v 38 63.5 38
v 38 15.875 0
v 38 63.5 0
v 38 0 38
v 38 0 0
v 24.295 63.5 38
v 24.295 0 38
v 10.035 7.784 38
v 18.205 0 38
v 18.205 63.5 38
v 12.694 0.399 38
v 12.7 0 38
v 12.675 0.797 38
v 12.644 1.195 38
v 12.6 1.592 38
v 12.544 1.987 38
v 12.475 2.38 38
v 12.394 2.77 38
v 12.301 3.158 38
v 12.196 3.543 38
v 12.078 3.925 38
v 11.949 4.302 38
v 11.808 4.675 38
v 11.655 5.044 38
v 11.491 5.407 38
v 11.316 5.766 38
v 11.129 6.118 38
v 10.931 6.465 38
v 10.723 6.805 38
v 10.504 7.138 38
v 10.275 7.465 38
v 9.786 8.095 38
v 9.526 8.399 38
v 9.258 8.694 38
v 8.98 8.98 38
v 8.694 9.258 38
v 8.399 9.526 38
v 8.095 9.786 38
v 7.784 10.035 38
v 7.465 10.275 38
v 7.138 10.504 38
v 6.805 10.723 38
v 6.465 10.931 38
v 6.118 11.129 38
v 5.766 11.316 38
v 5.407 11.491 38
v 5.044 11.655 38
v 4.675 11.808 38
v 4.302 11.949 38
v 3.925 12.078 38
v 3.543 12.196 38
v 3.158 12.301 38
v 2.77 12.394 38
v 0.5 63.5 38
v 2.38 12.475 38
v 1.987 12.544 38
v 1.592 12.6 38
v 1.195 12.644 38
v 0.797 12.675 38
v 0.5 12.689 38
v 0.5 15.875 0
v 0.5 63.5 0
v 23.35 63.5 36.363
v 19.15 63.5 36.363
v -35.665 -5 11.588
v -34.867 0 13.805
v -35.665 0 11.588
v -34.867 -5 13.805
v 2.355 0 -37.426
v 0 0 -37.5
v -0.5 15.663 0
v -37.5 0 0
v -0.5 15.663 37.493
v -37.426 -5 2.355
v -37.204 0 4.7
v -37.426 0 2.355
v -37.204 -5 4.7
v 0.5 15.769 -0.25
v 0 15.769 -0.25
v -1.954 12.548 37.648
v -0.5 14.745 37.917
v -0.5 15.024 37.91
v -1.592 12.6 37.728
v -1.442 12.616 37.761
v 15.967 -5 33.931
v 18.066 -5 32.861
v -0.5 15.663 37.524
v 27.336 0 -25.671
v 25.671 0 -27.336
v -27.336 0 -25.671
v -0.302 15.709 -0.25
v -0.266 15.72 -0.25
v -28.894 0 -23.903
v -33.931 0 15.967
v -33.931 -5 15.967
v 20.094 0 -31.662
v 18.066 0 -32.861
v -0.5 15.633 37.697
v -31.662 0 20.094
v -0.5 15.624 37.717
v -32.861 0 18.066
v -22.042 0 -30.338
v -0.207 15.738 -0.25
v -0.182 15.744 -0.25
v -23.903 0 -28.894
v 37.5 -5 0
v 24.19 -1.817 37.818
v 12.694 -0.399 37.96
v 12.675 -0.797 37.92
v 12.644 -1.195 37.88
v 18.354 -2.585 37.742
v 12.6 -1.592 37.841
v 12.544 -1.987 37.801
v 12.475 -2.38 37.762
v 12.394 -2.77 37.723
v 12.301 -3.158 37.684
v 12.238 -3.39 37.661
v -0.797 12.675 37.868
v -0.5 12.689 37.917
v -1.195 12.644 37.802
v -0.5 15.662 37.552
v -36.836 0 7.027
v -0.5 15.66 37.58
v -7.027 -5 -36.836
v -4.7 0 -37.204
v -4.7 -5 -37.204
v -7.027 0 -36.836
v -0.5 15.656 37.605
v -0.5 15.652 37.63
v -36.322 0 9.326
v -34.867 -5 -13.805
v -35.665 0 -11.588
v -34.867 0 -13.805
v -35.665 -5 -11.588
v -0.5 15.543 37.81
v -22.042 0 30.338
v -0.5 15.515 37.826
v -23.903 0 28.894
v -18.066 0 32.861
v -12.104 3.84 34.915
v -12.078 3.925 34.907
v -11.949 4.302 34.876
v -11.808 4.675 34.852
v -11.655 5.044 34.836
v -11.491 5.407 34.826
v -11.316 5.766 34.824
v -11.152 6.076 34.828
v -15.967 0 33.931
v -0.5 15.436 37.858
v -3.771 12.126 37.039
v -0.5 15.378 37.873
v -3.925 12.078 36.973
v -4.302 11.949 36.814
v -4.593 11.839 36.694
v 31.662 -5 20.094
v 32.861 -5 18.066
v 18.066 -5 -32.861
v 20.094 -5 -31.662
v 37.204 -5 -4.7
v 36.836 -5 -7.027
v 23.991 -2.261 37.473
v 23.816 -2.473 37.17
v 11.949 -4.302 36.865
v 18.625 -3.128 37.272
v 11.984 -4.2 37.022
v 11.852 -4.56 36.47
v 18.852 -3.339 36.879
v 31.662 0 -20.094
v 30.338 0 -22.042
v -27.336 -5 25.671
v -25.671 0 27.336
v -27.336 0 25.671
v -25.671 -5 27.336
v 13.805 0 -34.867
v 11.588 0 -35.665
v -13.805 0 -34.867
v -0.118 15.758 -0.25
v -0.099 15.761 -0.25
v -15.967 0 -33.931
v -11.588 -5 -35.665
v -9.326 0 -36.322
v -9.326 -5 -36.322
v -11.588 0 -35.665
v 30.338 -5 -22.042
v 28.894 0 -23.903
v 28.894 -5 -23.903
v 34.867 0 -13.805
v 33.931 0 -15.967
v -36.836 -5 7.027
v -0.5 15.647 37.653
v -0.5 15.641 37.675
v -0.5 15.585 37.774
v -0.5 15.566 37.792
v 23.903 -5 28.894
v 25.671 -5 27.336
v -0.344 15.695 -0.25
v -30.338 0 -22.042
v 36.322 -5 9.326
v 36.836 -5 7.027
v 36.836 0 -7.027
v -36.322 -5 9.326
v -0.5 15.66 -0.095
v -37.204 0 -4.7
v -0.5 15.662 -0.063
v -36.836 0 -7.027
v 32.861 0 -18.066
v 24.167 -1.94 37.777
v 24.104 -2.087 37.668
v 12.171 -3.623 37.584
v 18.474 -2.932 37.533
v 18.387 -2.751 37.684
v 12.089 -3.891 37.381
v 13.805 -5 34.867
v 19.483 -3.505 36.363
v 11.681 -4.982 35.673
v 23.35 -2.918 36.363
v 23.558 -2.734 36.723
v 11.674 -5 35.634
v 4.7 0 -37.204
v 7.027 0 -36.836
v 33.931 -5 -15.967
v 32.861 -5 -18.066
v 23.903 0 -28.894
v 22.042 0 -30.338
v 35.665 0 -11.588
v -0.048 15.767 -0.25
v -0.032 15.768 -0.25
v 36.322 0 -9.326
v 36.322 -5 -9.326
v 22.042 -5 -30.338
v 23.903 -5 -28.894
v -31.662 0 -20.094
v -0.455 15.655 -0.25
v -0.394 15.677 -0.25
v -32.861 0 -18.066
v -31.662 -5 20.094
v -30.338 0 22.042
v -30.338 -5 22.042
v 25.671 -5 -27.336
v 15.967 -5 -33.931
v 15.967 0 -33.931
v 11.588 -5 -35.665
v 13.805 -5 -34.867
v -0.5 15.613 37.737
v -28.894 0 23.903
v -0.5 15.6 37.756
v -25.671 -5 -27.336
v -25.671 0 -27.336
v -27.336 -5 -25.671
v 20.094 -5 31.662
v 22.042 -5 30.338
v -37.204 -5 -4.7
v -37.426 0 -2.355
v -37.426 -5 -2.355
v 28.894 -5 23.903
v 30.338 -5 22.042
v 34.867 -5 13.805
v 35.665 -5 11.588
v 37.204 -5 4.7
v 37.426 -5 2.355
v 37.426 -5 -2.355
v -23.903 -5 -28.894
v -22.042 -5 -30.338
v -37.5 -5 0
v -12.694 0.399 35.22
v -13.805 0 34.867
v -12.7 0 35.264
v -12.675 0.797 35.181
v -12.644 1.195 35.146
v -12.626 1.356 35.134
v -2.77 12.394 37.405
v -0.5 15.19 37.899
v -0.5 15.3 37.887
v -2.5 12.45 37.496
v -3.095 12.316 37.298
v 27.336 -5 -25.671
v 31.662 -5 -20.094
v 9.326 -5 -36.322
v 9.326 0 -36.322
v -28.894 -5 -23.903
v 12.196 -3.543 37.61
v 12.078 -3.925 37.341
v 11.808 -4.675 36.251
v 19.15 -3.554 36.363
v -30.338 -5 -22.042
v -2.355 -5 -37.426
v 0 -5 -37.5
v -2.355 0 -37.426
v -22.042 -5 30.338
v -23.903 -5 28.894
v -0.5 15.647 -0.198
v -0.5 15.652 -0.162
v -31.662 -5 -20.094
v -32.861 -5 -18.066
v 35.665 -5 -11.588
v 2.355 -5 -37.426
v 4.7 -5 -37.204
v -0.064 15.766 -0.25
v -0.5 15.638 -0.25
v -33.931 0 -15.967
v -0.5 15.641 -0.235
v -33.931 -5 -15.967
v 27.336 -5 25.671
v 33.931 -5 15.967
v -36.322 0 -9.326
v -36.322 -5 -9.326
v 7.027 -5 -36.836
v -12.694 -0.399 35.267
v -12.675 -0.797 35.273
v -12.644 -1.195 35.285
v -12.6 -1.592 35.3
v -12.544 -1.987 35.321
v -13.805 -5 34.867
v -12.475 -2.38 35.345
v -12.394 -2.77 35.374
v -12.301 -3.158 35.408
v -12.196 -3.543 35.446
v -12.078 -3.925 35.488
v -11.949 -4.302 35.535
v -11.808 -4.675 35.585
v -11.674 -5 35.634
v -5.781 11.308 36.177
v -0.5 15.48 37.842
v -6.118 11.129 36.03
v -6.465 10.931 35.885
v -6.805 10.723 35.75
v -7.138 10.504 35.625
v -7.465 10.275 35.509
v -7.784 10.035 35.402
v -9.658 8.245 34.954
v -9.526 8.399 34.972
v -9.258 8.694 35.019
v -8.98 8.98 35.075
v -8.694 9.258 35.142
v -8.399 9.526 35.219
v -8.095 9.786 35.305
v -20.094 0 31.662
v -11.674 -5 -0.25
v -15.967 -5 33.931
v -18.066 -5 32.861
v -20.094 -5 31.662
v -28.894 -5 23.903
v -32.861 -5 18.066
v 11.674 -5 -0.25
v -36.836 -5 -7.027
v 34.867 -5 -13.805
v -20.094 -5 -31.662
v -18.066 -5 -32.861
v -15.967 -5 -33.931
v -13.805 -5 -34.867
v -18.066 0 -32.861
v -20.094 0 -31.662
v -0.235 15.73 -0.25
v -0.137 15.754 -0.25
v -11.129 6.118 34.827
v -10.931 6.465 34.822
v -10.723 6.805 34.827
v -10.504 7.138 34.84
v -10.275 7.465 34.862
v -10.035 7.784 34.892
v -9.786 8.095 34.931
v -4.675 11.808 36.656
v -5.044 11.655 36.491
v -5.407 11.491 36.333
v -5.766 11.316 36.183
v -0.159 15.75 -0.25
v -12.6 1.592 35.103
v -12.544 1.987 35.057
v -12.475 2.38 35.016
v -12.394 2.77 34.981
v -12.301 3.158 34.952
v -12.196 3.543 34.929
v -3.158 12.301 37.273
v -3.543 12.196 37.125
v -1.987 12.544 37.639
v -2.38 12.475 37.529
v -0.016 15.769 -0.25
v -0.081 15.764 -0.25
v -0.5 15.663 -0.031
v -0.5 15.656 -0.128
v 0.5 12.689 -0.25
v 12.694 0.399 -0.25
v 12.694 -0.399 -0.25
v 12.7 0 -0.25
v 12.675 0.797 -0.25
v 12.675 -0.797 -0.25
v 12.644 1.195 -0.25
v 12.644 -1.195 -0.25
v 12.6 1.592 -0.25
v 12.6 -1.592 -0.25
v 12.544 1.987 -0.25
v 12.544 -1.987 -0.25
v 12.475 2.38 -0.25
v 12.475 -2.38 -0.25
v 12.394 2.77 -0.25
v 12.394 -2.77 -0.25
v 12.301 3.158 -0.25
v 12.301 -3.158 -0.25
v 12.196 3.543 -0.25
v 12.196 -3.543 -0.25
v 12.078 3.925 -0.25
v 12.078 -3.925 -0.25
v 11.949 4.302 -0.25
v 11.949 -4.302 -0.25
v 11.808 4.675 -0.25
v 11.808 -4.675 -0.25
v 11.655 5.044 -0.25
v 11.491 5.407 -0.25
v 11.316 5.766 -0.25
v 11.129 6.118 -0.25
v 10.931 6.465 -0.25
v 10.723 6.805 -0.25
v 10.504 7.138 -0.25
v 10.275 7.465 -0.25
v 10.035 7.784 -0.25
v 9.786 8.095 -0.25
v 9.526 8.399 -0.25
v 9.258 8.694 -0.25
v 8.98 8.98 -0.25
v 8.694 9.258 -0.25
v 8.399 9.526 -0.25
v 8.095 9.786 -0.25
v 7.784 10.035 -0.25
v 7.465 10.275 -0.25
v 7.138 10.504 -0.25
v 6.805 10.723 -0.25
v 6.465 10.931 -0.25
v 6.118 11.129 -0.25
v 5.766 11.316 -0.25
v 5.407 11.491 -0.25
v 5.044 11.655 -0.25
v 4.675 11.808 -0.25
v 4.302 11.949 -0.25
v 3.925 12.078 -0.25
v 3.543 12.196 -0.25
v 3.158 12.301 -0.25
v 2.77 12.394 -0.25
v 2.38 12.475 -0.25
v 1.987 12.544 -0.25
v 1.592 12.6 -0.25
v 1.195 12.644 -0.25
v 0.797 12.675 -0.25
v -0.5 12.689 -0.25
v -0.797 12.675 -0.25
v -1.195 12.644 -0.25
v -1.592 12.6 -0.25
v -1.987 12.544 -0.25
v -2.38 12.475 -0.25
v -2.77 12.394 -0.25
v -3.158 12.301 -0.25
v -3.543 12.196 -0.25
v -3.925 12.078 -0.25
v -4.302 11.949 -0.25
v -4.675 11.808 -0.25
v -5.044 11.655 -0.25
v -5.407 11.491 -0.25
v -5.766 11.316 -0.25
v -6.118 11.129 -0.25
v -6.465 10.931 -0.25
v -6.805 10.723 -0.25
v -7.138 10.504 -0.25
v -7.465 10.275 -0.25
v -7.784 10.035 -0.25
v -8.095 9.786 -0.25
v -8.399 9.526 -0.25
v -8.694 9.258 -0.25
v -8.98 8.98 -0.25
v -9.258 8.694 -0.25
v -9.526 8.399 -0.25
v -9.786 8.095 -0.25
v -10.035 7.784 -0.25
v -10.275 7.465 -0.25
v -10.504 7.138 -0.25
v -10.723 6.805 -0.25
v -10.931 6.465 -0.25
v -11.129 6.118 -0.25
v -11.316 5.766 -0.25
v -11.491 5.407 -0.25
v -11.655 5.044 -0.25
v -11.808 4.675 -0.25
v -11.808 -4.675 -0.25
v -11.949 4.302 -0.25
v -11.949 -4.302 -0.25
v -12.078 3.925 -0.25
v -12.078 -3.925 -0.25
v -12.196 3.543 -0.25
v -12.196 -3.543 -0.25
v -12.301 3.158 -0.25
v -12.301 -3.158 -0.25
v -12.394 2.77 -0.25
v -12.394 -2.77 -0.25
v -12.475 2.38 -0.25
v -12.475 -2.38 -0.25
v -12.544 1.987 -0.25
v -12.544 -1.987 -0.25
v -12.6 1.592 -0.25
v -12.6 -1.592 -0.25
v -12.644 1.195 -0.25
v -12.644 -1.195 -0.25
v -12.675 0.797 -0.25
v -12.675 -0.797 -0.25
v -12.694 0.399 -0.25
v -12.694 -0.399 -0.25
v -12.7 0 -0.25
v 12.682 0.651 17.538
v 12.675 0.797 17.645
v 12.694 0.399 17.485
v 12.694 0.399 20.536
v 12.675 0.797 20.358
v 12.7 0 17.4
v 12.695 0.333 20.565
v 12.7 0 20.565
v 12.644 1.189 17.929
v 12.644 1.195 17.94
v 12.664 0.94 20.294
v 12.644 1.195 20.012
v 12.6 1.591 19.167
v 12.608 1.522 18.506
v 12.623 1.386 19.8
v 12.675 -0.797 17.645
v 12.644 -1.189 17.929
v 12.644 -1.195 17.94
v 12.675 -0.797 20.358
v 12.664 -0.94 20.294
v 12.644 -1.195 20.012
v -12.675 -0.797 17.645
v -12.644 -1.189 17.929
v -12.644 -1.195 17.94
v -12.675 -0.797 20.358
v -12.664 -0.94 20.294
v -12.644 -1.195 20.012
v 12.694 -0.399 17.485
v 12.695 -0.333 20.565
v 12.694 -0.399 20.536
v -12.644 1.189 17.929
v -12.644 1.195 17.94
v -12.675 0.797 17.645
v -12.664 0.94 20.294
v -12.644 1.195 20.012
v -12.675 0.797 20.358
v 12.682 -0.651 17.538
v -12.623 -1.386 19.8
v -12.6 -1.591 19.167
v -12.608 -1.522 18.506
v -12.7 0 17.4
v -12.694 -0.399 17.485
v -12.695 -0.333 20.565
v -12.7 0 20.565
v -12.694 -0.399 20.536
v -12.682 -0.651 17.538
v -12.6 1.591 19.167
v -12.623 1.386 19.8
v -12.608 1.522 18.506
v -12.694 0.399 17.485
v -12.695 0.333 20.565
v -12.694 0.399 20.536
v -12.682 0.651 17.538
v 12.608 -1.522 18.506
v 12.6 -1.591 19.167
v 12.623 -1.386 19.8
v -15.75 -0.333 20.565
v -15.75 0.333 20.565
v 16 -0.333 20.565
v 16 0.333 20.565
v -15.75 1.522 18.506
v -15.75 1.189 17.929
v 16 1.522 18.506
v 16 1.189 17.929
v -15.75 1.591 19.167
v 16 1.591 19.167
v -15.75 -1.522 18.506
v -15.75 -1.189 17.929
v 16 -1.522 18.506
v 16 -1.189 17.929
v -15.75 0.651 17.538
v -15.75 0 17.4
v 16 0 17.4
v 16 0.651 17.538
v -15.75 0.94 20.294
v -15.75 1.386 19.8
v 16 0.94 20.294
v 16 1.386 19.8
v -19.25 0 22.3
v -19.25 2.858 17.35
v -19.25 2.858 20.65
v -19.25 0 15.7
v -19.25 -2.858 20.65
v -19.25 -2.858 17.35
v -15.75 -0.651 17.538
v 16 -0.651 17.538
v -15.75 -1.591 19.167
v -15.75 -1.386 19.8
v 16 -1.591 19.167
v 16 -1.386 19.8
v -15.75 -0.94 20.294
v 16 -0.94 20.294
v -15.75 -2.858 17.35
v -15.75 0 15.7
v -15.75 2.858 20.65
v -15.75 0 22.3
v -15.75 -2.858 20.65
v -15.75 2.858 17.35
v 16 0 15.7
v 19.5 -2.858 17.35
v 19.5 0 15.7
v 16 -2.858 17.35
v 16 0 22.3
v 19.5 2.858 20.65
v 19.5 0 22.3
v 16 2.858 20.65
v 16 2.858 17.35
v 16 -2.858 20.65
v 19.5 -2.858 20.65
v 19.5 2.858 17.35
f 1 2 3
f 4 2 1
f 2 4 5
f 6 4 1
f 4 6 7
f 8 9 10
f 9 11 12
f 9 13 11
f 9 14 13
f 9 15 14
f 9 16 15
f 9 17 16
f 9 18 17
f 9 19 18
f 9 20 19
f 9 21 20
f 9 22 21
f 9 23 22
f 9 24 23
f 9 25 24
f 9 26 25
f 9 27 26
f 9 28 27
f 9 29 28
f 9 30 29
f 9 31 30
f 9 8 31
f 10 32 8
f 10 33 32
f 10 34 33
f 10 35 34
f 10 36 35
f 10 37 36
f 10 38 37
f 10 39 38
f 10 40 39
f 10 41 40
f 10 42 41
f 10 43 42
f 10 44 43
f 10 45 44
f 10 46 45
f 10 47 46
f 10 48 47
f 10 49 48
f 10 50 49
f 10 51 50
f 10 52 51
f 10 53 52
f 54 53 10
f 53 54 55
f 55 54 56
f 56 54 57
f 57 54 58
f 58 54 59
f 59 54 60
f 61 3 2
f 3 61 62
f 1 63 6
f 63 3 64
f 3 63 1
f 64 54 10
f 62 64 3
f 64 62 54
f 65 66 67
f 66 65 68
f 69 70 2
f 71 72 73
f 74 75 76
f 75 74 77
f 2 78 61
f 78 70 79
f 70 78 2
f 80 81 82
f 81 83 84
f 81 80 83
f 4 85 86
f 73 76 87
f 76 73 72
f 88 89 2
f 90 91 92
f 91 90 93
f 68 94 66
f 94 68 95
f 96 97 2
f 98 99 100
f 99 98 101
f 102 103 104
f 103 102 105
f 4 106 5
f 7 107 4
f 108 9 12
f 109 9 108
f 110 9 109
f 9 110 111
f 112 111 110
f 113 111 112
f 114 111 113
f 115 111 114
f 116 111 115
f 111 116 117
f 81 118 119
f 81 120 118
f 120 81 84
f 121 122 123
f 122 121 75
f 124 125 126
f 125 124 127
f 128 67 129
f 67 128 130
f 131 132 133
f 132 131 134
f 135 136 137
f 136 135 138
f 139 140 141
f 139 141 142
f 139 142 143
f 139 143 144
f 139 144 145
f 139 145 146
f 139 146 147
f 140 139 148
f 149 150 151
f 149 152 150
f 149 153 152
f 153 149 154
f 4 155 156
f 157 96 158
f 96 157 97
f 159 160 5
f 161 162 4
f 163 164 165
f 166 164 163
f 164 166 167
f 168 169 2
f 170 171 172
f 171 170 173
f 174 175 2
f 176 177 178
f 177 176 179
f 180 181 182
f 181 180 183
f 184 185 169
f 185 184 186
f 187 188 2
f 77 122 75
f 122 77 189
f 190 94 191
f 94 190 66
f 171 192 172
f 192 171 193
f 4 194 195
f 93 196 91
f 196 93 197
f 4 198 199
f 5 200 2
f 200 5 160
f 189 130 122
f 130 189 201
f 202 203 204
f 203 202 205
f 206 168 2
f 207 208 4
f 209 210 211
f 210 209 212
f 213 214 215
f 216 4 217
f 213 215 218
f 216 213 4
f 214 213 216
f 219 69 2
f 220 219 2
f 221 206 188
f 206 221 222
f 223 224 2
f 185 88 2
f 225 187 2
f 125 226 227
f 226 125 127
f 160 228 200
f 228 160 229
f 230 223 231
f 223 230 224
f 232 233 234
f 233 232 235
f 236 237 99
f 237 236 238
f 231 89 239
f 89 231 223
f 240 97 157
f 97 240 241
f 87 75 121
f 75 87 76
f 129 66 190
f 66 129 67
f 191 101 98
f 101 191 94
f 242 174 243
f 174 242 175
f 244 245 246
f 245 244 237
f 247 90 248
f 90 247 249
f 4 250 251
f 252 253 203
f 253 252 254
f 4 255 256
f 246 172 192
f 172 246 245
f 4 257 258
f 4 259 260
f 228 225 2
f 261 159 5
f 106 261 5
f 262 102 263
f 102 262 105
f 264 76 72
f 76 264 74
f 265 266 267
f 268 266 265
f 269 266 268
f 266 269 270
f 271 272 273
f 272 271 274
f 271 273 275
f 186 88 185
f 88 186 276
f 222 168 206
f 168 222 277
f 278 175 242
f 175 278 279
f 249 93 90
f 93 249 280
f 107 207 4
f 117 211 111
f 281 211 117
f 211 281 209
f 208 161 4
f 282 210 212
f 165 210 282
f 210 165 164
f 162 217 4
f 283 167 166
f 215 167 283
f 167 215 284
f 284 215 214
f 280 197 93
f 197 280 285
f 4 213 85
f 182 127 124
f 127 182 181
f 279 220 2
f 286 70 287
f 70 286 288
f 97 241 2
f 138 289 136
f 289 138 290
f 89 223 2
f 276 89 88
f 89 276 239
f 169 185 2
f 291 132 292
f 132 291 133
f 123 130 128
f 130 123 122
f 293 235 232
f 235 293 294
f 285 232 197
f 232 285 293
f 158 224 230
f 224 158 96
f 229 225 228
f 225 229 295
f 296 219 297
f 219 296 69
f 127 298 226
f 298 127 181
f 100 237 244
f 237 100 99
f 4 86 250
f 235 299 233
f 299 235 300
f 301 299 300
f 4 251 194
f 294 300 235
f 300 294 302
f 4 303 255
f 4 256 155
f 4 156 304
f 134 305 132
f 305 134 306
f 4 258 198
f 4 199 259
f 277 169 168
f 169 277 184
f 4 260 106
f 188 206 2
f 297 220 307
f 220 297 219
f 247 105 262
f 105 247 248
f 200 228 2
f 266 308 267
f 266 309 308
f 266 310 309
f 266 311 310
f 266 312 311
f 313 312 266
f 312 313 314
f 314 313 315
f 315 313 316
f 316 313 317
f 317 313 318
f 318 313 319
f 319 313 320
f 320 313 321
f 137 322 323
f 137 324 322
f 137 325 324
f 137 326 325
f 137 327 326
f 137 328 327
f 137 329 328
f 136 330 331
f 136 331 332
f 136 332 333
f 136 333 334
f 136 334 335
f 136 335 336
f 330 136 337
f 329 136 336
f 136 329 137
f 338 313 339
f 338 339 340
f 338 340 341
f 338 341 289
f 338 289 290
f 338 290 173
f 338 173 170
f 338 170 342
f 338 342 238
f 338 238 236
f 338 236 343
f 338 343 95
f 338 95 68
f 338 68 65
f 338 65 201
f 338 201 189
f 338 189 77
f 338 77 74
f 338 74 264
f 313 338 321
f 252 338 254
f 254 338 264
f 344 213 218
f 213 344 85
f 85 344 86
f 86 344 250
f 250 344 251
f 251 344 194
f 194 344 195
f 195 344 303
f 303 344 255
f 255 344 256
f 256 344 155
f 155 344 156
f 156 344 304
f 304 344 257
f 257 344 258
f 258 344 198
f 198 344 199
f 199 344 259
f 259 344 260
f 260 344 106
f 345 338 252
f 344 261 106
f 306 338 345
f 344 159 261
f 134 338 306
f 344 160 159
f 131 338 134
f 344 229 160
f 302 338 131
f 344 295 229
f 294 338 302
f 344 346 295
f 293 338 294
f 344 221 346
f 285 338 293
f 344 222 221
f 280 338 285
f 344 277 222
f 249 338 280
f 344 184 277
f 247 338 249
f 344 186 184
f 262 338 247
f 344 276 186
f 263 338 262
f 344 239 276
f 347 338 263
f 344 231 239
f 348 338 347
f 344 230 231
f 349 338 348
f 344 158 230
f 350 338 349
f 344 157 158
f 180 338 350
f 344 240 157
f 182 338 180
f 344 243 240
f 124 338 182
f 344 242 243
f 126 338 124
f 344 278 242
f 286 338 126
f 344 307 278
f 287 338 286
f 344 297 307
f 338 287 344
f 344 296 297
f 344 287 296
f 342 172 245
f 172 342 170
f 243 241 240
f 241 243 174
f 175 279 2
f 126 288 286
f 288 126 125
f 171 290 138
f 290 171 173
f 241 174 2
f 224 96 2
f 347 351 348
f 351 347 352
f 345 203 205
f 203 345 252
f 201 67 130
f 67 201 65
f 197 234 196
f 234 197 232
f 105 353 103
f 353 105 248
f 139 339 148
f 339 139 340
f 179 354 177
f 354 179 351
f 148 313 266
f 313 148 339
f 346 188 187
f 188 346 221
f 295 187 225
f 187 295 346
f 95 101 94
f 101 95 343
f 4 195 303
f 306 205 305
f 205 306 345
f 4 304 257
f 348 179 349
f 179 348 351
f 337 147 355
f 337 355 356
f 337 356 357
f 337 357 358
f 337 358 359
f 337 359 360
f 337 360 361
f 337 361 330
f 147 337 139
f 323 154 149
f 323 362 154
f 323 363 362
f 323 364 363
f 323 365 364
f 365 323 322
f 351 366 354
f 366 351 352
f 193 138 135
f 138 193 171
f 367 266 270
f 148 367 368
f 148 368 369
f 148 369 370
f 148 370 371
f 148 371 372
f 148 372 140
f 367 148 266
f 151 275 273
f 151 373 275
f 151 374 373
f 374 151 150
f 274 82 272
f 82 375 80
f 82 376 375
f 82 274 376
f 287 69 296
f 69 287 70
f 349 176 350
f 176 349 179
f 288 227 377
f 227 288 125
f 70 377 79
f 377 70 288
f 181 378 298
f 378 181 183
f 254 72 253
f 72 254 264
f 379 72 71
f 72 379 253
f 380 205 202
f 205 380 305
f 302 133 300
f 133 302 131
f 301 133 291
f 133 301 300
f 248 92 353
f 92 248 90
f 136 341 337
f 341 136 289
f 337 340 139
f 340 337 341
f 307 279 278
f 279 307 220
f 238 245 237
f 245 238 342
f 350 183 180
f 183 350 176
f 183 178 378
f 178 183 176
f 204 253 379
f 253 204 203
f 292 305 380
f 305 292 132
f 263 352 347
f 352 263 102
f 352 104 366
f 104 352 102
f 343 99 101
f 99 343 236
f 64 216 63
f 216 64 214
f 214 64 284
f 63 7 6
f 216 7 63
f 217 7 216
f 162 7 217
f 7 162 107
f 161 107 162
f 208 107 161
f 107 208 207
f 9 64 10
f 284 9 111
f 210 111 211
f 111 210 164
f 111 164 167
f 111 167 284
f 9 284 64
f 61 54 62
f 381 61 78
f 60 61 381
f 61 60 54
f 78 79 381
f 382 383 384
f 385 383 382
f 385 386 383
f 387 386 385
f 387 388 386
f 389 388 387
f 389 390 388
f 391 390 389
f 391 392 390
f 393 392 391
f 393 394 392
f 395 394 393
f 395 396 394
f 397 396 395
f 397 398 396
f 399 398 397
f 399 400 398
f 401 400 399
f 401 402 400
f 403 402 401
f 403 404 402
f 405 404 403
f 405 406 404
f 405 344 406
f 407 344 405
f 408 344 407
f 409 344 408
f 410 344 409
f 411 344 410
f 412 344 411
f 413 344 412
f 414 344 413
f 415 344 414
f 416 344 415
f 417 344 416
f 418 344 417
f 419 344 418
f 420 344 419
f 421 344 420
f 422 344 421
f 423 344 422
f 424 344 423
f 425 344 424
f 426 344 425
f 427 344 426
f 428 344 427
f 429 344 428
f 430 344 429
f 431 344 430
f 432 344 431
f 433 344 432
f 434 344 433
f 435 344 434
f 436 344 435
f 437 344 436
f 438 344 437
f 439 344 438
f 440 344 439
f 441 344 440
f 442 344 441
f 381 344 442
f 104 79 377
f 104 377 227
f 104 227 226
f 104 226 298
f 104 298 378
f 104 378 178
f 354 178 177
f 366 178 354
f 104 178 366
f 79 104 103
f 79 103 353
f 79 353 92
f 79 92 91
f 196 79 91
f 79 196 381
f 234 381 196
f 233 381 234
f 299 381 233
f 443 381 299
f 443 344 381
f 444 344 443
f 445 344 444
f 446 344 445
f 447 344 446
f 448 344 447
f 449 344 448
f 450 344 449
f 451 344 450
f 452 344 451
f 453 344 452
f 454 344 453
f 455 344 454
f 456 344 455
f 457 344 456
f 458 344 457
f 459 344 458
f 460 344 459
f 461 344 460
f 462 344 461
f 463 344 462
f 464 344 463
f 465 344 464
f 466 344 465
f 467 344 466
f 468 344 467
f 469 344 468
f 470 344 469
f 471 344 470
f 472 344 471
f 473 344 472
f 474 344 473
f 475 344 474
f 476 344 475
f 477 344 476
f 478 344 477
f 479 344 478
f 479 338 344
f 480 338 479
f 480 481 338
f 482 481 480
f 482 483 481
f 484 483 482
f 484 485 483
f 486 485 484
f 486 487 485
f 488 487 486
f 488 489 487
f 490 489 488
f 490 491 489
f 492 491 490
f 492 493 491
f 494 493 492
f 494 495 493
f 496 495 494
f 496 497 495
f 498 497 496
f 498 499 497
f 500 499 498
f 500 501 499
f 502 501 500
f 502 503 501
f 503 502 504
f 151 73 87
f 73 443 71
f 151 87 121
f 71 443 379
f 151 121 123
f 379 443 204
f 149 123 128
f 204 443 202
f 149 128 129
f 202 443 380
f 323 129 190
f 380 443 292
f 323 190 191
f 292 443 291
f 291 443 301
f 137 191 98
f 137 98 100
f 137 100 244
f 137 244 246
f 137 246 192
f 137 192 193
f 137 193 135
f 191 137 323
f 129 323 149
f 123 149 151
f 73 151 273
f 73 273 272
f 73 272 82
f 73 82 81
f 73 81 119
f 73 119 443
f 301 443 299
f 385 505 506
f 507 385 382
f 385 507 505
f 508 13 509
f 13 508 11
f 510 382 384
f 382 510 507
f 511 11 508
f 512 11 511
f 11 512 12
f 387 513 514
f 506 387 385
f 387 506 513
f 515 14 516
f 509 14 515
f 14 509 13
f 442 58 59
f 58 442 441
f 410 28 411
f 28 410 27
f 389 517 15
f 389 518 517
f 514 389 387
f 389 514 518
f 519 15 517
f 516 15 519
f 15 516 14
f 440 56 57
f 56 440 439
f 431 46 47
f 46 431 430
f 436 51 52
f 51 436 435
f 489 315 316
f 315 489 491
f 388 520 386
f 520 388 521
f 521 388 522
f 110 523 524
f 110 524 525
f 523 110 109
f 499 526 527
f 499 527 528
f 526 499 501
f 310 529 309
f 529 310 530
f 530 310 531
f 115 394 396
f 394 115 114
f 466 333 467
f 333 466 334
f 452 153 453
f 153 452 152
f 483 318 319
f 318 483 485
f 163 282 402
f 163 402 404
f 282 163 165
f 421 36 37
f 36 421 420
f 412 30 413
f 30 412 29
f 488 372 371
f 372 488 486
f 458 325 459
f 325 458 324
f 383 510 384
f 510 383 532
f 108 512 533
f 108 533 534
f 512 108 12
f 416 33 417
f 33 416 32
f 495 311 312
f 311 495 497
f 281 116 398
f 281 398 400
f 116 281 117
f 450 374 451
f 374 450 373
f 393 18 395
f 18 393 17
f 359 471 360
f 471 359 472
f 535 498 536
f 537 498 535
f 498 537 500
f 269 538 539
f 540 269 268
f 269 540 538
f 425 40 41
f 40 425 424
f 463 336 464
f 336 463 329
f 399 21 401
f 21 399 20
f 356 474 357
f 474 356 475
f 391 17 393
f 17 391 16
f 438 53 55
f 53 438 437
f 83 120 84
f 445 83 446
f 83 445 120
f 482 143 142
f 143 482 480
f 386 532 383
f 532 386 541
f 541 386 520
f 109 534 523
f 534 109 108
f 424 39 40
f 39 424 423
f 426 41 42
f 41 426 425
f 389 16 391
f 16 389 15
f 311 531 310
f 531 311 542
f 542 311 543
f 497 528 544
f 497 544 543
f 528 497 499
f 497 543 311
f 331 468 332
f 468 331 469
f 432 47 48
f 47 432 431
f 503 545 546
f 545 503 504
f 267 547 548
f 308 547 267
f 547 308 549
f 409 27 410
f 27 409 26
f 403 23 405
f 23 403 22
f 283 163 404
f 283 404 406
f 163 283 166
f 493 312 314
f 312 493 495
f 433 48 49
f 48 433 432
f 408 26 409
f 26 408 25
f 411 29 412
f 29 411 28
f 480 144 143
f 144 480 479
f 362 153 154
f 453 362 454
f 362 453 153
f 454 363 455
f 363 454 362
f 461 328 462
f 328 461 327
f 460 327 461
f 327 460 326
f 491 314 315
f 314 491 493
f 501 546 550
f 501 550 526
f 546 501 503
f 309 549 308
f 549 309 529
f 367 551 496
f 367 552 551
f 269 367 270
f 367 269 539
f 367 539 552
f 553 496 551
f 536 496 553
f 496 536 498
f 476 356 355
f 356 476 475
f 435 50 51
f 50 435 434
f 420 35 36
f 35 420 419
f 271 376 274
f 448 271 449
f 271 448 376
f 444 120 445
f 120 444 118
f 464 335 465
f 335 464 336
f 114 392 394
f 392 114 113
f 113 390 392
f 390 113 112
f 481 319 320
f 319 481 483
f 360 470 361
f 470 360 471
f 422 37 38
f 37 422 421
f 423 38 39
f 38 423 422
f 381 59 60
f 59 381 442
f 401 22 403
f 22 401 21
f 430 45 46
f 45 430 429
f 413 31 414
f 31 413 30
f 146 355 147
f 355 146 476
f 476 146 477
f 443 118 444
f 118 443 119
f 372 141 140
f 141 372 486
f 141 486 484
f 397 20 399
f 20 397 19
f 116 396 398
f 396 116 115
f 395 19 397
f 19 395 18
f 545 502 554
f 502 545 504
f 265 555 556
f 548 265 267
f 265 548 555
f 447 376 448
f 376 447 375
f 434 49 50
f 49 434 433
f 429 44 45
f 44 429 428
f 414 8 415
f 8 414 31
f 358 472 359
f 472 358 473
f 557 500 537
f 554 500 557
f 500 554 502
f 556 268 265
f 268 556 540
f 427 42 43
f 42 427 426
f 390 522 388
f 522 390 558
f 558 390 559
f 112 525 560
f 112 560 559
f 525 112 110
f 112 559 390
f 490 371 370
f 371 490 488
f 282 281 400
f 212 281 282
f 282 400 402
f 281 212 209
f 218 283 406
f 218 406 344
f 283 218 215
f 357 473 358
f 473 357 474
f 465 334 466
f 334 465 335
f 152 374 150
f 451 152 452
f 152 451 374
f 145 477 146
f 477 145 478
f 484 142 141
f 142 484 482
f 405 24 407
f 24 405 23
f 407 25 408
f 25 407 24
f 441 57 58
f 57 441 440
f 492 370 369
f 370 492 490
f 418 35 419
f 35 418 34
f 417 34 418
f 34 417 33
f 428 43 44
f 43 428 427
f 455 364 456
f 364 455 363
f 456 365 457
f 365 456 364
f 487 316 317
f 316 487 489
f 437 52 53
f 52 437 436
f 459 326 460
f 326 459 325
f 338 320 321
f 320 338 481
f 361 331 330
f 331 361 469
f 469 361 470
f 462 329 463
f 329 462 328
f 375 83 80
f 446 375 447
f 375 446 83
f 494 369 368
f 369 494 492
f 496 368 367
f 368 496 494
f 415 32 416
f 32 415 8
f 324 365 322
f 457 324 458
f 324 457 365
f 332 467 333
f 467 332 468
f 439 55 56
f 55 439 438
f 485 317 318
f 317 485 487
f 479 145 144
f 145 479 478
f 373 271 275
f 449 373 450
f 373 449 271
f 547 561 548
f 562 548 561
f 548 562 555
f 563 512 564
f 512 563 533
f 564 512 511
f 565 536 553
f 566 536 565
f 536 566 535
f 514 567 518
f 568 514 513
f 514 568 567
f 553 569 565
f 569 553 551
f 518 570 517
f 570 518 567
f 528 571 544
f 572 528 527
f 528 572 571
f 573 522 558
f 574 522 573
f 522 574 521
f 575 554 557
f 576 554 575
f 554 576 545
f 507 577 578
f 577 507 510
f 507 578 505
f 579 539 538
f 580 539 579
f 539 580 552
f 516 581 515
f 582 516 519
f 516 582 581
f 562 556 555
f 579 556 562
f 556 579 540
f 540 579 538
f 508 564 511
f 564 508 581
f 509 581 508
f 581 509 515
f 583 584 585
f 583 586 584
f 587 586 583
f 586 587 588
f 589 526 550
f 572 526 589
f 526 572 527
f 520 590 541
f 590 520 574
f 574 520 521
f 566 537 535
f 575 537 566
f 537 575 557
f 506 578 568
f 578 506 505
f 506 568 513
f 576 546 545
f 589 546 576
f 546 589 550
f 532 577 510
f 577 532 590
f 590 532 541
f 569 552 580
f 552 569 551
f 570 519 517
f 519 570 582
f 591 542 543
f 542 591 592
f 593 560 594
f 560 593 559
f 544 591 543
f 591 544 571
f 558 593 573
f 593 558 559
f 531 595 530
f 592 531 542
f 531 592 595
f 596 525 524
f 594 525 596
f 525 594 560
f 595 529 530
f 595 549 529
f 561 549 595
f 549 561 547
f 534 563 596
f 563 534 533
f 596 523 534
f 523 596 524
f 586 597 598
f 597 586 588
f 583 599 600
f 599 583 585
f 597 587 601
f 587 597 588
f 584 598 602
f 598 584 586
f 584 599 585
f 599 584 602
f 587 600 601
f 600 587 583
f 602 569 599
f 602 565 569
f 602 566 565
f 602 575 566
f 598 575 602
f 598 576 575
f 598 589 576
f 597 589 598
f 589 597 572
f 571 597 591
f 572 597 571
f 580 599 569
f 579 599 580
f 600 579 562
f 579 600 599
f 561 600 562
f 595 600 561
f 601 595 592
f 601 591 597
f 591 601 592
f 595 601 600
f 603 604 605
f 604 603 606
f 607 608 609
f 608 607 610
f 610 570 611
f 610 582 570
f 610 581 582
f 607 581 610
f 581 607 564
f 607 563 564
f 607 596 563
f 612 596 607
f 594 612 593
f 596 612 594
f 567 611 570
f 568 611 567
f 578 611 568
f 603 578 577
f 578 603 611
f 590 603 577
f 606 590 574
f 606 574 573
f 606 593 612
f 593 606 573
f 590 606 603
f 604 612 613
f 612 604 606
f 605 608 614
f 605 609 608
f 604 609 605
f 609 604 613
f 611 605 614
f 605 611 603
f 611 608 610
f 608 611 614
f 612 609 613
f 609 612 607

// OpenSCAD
// file: ../888_2003.scad
include <../parameters.scad>

module 888_2003 (coupling_wall_thickness, thickness_between_tubes,draft = true){

//modifikace spojky 666_1004

    bevelled_width = main_tube_outer_diameter + 2*coupling_wall_thickness;

    magnet_displacement = 40;
    wall_thickness = 5;
    screw_length = 30;
    magnet_diameter = 75;
    distance_between_screws = 42.5;


    difference(){

        union(){
            translate([-(coupling_width_666_1004/2), - depth_666_1004 + main_tube_outer_diameter/2 + coupling_wall_thickness,0])
                  cube([coupling_width_666_1004, depth_666_1004, height_666_1004]);


            hull(){

                translate([-(coupling_width_666_1004/2), - depth_666_1004 + main_tube_outer_diameter/2 + coupling_wall_thickness,0])
                      cube([coupling_width_666_1004, depth_666_1004/4, height_666_1004]);

                translate([0, - depth_666_1004 + main_tube_outer_diameter/2 + coupling_wall_thickness , magnet_displacement])
                    rotate([90, 0, 0])
                        cylinder(d = magnet_diameter, h = 5, $fn = draft?50:100);
            }

        }

        // middle cut
        translate ([-0.5, -depth_666_1004 , - global_clearance/2])
            cube ([1, 3*depth_666_1004 + global_clearance, 3* height_666_1004 + global_clearance]);

        //tubes
        translate([0,0,- global_clearance/2])
                cylinder(h = height_666_1004 + global_clearance,r = main_tube_outer_diameter/2, $fn= draft ? 50 : 200);

        //screw
        translate([-coupling_width_666_1004/2 - global_clearance/2,0,height_666_1004/2])
           rotate ([0,90,0])   
                cylinder(h = coupling_width_666_1004 + global_clearance, r = M3_screw_diameter/2, $fn = 15);
                
        //nut
        translate([-coupling_width_666_1004/2 - global_clearance/2,0, height_666_1004/2])
            rotate ([0,90,0])
                cylinder (h = M3_screw_head_height + global_clearance, r = M3_nut_diameter/2, $fn = 6);
        
        translate([coupling_width_666_1004/2 - M3_screw_head_height,0,height_666_1004/2])
           rotate ([0,90,0])
                cylinder (h = M3_screw_head_height + global_clearance, r = M3_nut_diameter/2, $fn = 6);

        translate([distance_between_screws/2, - depth_666_1004 + main_tube_outer_diameter/2, magnet_displacement]) 
            rotate([-90, 0, 0])
            {
                cylinder(d = M4_screw_diameter, h = 10 + global_clearance, $fn=50);
                translate([0,0,5])
                   cylinder(d = M4_nut_diameter, h = 50 * M4_nut_height, $fn = 6);
            }

        translate([- distance_between_screws/2,- depth_666_1004 + main_tube_outer_diameter/2 , magnet_displacement])
            rotate([-90, 0, 0])
            { 
                cylinder(d = M4_screw_diameter, h = 10 + global_clearance, $fn = 50);
                translate([0,0,5])
                    cylinder(d = M4_nut_diameter, h = 50 * M4_nut_height, $fn = 6);
            }


    }

}


888_2003 (coupling_wall_thickness, thickness_between_tubes, draft = true);
// main file
include <../../parameters.scad>

use <../888_2003.scad>

        888_2003(draft=false);
